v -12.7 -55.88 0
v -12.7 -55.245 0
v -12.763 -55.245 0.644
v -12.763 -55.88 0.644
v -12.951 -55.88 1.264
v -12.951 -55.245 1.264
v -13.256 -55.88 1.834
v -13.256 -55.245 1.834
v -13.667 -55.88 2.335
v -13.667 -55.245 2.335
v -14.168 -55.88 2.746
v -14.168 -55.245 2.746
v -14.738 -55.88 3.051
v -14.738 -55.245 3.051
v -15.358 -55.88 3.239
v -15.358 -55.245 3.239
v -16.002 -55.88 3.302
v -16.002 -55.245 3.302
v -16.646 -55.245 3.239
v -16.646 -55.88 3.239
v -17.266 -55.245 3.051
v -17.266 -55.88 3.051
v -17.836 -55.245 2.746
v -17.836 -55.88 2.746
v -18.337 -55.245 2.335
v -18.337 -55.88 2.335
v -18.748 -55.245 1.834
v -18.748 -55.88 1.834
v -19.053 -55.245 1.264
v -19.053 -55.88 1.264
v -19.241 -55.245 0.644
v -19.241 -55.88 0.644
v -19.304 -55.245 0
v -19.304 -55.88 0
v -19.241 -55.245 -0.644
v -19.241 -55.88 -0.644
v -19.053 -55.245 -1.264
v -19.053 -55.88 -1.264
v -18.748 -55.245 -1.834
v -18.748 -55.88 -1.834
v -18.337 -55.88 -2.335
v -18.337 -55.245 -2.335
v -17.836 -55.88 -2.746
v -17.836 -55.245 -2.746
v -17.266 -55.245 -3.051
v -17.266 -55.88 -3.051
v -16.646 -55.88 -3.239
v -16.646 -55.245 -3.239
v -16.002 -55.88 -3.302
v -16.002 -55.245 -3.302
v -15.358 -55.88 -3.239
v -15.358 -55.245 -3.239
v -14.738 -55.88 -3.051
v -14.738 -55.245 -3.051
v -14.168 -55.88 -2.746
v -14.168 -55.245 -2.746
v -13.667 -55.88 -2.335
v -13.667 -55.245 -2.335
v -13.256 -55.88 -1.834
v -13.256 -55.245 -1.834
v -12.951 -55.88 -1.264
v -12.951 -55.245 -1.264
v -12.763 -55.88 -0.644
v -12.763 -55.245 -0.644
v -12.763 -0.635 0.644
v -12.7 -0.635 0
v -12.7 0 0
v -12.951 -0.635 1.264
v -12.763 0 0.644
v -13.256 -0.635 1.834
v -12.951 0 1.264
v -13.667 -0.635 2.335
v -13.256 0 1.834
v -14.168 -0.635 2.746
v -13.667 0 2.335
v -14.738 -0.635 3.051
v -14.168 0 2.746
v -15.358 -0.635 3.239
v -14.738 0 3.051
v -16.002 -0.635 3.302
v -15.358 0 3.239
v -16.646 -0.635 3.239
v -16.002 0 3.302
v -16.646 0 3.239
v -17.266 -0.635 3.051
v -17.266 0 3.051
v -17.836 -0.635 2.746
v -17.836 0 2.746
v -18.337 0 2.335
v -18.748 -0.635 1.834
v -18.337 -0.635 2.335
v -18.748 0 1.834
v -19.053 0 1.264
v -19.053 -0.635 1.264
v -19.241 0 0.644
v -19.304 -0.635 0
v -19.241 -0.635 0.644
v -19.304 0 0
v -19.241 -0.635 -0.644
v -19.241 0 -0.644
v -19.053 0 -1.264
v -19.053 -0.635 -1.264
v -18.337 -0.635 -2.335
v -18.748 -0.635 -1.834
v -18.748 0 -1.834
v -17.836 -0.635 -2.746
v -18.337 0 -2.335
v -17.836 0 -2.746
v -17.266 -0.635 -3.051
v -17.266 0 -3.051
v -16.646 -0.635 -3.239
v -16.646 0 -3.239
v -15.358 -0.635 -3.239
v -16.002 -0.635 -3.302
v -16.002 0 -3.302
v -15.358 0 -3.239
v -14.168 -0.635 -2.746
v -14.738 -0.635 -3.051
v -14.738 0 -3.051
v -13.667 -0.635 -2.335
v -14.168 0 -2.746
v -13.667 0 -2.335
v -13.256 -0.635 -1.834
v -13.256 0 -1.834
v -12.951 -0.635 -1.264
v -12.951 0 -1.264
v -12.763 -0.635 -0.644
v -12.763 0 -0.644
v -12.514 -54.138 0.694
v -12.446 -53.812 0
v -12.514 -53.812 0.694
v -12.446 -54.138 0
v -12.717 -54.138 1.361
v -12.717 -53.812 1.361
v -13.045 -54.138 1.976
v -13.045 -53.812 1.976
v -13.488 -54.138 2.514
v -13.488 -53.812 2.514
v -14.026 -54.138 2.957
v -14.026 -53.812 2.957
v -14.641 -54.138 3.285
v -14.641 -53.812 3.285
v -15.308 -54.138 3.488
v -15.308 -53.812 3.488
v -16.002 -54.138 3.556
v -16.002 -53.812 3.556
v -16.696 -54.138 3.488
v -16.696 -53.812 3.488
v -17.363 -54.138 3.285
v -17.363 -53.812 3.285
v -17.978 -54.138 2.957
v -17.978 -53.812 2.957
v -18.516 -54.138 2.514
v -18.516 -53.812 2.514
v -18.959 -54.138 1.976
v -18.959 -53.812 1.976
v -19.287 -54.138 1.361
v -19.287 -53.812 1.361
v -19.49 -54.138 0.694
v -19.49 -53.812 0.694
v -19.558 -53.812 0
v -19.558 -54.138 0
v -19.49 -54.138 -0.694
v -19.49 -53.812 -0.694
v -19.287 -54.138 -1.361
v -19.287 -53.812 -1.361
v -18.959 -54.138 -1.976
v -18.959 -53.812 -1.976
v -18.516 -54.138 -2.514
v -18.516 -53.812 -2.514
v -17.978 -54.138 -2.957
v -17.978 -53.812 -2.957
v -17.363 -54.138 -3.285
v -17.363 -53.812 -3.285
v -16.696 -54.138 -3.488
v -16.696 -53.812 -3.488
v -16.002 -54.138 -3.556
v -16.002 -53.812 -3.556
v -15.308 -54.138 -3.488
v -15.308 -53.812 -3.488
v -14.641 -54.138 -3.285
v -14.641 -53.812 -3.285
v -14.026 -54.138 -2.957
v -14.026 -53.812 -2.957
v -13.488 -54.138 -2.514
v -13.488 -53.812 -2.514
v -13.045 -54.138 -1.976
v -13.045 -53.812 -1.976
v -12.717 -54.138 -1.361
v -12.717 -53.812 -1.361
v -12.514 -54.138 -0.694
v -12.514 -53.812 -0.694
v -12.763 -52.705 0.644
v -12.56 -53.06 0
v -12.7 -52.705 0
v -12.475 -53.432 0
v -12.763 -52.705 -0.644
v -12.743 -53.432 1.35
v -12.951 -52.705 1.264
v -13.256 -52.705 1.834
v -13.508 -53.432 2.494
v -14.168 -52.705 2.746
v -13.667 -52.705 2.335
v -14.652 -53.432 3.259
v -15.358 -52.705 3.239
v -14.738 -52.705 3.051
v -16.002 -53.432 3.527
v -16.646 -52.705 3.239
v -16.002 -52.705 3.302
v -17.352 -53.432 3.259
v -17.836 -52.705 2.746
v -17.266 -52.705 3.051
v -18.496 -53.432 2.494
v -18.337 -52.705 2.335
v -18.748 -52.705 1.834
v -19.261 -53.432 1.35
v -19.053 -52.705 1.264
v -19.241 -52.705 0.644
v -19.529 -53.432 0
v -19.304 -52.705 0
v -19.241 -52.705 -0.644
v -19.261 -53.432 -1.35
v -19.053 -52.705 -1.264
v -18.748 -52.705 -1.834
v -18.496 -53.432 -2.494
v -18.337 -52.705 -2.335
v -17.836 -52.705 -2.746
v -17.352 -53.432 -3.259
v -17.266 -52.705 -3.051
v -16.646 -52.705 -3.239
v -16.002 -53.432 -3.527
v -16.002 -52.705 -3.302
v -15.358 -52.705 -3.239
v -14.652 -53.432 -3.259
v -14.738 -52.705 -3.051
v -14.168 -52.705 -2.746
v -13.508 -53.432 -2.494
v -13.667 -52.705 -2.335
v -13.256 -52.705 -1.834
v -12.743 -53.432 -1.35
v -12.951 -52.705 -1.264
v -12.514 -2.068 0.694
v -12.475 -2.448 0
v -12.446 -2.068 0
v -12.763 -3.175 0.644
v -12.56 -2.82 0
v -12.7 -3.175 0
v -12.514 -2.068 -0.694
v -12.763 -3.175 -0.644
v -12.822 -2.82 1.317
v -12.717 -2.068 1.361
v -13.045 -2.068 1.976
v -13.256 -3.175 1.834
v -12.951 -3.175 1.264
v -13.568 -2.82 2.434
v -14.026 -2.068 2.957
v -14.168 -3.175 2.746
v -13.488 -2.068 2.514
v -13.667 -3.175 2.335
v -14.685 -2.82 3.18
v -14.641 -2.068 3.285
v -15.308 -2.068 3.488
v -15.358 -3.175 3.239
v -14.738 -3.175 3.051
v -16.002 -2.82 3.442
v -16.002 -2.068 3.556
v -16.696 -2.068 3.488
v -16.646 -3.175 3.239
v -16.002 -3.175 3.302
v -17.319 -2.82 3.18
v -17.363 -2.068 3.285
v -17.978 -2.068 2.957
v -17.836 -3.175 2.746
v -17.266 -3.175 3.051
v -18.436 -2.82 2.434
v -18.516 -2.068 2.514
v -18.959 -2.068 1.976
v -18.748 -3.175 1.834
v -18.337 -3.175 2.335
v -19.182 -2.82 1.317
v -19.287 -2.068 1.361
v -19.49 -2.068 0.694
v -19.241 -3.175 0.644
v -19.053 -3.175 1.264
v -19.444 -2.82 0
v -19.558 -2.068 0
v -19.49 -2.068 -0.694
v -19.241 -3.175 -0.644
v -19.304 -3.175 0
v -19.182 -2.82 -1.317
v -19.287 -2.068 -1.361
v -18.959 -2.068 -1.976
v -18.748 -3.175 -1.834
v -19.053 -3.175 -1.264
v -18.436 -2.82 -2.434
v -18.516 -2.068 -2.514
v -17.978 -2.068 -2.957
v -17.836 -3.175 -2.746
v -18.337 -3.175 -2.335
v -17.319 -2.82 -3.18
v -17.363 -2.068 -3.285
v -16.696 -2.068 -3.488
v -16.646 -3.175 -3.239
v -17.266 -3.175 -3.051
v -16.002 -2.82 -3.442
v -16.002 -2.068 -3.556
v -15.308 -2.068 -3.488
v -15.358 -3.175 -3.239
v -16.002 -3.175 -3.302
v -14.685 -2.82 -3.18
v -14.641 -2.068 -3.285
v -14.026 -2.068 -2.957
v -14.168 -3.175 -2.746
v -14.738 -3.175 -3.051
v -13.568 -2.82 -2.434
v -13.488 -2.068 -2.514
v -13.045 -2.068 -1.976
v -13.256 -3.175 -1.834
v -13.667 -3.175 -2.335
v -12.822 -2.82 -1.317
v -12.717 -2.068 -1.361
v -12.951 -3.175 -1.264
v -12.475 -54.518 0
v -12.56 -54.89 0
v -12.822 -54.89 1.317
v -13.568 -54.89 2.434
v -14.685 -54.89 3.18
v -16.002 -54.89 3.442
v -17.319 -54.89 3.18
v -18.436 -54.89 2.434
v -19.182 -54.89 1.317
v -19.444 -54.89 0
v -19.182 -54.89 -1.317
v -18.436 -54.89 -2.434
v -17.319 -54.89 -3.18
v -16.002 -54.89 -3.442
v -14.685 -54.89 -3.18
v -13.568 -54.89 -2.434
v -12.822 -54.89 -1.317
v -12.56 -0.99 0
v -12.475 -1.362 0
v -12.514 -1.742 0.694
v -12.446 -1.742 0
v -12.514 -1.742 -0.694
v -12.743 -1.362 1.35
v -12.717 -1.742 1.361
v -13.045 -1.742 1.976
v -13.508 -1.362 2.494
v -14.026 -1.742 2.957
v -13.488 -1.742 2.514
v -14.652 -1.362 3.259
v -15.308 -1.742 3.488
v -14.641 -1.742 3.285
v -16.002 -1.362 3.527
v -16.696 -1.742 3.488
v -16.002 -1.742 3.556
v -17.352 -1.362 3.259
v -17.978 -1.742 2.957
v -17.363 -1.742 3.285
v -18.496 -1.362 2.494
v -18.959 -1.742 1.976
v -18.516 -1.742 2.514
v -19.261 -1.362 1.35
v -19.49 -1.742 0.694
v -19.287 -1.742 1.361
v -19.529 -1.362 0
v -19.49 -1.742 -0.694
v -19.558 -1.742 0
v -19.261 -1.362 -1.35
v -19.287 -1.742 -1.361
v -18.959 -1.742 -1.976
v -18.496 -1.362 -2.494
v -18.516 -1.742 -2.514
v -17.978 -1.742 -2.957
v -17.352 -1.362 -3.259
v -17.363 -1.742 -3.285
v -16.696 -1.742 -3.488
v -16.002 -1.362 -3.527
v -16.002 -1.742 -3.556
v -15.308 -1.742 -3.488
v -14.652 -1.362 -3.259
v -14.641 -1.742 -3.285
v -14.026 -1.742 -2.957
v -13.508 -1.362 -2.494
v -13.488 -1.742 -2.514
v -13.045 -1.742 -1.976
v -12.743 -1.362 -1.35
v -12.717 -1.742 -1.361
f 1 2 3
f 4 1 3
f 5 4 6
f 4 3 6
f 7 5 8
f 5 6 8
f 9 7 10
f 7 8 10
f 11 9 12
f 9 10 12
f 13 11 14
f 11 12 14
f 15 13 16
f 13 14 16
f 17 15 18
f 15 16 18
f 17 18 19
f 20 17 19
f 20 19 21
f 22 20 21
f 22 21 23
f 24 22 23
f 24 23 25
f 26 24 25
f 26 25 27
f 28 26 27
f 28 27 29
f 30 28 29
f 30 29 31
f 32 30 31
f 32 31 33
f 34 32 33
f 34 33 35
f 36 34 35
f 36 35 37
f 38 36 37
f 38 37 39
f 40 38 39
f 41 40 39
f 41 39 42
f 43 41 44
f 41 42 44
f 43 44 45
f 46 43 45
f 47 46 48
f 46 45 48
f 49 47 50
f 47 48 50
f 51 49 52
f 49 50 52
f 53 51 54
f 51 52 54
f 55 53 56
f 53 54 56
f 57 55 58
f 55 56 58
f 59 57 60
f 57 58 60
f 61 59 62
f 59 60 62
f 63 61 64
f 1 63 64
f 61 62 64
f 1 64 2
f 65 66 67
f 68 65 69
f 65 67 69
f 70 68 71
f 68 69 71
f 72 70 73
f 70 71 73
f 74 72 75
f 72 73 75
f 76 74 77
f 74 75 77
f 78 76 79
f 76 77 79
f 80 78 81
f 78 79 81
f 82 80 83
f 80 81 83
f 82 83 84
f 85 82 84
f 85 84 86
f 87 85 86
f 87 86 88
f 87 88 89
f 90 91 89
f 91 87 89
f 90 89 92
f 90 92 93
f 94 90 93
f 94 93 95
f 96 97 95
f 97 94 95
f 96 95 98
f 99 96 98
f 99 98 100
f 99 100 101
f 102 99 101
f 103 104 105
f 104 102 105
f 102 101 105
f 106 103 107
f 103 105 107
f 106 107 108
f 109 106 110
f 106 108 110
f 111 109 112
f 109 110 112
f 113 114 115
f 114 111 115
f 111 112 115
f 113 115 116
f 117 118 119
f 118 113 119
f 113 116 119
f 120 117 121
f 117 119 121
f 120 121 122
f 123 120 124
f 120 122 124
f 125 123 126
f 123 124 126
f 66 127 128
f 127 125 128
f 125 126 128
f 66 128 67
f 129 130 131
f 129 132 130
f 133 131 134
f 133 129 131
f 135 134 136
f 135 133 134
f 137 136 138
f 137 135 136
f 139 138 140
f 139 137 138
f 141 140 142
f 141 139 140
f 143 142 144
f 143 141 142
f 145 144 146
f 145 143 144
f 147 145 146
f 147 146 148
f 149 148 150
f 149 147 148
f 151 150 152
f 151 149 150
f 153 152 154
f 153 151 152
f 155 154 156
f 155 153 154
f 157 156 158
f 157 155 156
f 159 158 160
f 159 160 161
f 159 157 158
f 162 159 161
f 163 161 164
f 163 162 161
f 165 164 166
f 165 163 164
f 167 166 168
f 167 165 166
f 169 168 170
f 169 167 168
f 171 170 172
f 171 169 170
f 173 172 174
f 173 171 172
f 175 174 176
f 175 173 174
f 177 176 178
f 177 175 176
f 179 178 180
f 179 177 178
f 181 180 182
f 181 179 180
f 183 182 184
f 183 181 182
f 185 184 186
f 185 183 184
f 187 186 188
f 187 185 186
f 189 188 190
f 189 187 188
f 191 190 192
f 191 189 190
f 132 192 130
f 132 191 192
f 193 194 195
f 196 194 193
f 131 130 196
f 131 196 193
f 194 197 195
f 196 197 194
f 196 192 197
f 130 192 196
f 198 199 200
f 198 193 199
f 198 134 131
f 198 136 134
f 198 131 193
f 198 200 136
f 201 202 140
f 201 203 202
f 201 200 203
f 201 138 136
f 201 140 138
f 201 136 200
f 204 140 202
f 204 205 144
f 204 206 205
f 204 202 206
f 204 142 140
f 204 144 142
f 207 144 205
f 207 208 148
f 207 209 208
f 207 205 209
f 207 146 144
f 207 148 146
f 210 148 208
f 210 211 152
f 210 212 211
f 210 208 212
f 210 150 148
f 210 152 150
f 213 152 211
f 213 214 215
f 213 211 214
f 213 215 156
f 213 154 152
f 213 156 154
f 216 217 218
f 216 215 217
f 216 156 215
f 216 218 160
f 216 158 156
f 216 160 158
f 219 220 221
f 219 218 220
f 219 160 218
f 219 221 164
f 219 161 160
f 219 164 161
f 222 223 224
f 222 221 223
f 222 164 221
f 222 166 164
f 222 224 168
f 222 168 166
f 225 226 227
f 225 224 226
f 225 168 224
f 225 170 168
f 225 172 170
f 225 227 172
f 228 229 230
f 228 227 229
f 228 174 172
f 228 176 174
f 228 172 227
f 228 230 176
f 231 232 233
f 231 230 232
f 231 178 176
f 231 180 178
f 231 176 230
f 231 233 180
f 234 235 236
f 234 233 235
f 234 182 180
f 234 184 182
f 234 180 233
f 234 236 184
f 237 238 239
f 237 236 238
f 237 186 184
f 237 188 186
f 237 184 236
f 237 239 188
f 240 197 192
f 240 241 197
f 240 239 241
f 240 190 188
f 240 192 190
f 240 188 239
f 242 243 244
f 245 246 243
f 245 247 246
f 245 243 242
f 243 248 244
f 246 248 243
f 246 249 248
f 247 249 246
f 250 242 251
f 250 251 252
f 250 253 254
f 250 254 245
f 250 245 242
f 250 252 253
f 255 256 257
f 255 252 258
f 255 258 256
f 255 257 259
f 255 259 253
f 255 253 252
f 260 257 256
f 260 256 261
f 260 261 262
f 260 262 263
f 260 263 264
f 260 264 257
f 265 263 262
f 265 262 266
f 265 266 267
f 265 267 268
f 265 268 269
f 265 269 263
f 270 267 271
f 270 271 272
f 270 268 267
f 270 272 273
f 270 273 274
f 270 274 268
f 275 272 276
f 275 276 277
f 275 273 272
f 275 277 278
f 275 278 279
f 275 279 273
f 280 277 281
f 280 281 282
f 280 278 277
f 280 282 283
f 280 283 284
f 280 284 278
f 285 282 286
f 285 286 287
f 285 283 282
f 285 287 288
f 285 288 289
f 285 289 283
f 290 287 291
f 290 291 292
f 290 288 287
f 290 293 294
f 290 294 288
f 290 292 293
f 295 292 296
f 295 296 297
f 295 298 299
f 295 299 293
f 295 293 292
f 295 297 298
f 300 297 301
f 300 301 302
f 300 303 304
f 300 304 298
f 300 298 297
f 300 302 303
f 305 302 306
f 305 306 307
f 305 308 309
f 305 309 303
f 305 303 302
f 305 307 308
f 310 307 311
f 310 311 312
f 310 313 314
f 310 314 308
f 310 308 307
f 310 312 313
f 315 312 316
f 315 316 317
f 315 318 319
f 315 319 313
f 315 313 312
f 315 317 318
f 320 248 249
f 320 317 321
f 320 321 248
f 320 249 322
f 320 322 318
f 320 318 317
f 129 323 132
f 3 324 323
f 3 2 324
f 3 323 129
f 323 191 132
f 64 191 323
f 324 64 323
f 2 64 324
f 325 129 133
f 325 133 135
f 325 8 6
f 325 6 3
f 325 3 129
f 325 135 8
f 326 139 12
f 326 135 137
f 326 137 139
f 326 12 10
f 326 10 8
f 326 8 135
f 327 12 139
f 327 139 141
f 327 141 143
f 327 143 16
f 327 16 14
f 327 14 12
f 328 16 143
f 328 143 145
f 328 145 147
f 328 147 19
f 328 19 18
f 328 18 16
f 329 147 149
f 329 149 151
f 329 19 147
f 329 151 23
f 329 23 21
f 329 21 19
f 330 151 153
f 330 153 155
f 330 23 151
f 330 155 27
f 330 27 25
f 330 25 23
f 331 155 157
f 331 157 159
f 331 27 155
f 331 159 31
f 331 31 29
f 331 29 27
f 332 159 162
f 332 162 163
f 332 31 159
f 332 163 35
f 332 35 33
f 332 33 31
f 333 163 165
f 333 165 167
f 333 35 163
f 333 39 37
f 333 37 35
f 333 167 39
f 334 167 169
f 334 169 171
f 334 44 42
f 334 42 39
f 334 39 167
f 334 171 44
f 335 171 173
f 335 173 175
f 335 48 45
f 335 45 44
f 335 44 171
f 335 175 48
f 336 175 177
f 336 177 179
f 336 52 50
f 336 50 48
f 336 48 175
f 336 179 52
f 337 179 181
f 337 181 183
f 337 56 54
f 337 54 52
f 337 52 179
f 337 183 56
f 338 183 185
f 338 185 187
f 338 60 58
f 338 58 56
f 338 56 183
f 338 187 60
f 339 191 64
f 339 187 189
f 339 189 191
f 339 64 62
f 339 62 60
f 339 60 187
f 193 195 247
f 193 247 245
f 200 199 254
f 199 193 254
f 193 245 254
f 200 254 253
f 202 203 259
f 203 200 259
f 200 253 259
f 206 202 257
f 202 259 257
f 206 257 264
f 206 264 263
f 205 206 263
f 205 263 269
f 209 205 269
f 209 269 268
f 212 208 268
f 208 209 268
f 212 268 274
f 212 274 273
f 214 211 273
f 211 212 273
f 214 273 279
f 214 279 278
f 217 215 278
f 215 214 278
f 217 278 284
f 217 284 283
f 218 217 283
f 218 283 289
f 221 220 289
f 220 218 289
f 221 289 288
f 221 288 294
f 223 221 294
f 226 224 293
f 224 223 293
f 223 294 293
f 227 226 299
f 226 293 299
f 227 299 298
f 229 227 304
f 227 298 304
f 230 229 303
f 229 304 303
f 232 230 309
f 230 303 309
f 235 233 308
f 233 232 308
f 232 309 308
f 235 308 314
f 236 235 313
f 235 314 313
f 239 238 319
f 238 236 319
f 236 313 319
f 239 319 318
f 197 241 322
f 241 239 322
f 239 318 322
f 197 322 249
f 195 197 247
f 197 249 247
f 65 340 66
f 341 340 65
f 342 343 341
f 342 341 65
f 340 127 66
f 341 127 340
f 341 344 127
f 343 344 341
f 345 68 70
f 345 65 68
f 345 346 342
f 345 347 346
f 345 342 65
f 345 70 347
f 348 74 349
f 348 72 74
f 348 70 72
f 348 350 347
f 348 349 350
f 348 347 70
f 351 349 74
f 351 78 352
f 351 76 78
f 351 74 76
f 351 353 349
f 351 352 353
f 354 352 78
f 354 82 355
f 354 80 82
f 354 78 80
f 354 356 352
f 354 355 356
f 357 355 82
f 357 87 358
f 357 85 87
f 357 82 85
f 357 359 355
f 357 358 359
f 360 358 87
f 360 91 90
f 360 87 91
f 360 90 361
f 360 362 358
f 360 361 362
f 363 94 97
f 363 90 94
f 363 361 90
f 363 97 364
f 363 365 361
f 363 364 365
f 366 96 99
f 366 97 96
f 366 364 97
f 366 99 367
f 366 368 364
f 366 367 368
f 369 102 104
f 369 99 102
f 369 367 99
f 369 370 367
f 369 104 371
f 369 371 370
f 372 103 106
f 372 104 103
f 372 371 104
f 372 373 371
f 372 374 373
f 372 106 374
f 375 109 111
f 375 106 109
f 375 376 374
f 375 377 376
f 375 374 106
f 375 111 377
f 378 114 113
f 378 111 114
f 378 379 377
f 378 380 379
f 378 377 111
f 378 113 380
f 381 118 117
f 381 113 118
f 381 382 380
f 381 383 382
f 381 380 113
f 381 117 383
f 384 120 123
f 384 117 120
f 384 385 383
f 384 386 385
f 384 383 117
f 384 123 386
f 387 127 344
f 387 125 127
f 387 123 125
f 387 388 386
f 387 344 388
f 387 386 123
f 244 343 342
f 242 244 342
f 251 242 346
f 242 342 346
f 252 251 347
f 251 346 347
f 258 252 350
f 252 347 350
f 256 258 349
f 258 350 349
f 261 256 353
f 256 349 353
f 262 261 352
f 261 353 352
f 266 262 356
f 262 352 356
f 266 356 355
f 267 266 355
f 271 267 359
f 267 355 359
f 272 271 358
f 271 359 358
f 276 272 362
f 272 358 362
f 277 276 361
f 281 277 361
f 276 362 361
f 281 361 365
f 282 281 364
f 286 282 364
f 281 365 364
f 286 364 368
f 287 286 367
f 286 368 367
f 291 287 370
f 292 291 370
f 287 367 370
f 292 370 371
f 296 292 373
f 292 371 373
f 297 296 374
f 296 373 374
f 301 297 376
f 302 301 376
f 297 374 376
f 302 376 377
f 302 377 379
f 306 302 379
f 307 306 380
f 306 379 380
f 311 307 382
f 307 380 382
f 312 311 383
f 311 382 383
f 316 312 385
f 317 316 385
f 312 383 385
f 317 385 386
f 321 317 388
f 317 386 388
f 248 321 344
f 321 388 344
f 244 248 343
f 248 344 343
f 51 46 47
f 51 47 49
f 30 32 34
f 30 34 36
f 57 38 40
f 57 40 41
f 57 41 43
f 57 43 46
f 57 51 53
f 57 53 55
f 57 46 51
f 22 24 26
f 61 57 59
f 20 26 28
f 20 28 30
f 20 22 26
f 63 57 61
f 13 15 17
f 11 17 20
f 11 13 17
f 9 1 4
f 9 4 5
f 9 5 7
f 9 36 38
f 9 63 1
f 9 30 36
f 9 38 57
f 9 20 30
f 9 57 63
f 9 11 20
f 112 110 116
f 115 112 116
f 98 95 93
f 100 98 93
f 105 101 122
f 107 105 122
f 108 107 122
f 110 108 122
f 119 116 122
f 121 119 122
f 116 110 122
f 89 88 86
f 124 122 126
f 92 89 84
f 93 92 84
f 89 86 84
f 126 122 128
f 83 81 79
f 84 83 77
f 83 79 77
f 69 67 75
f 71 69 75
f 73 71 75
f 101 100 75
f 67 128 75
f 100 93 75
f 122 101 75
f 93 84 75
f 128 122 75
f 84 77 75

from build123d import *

# Parameters (mm, degrees)
F0_R     = 3.302
F1_DEPTH = 55.88
F3_R     = 3.556
F4_DEPTH = 1.27


# Not quite as in the source:
# - a fillet or chamfer that OpenCascade refuses, or shapes differently, is made with other operations: its cross-section is extruded or revolved along the edge and cut away or added
# - a feature names something its author has since deleted; it is built from what else it names


with BuildPart() as f1:
    # F0 (on Front) → F1 (new body)
    with BuildSketch(Plane.XZ):
        with Locations((-16.002, 0)):
            Circle(F0_R)
    extrude(amount=F1_DEPTH)

    # F3 (on offset) → F4 (join, symmetric)
    with BuildSketch(Plane.XZ.offset(53.975)):
        with Locations((-16.002, 0)):
            Circle(F3_R)
    extrude(amount=F4_DEPTH, both=True)

    # F6: F1 across plane


with BuildPart() as f1_1:
    add(f1.part)
    add(f1.part.mirror(Plane(origin=(-16.002, -27.94, 0), x_dir=(1, 0, 0), z_dir=(0, -1, 0))))

    # F7: fillet of radius 2.54 on 4 edges, made by hand

    # F7_s1 → F7_t2 (revolve, cut)
    with BuildSketch(Plane.XY):
        with BuildLine():
            ThreePointArc((-12.446, -54.1378396683), (-12.5103142364, -54.7058009346), (-12.7, -55.245))
            Line((-12.7, -55.245), (-12.446, -55.245))
            Line((-12.446, -55.245), (-12.446, -54.1378396683))
        make_face()
    revolve(axis=Axis((-16.002, -55.245, 0), (0, -1, 0)), mode=Mode.SUBTRACT)

    # F7_s3 → F7_t4 (revolve, cut)
    with BuildSketch(Plane.XY):
        with BuildLine():
            ThreePointArc((-12.7, -52.705), (-12.5103142364, -53.2441990654), (-12.446, -53.8121603317))
            Line((-12.446, -53.8121603317), (-12.446, -52.705))
            Line((-12.446, -52.705), (-12.7, -52.705))
        make_face()
    revolve(axis=Axis((-16.002, -52.705, 0), (0, -1, 0)), mode=Mode.SUBTRACT)

    # F7_s5 → F7_t6 (revolve, cut)
    with BuildSketch(Plane.XY):
        with BuildLine():
            ThreePointArc((-12.446, -2.0678396683), (-12.5103142364, -2.6358009346), (-12.7, -3.175))
            Line((-12.7, -3.175), (-12.446, -3.175))
            Line((-12.446, -3.175), (-12.446, -2.0678396683))
        make_face()
    revolve(axis=Axis((-16.002, -3.175, 0), (0, -1, 0)), mode=Mode.SUBTRACT)

    # F7_s7 → F7_t8 (revolve, cut)
    with BuildSketch(Plane.XY):
        with BuildLine():
            ThreePointArc((-12.7, -0.635), (-12.5103142364, -1.1741990654), (-12.446, -1.7421603317))
            Line((-12.446, -1.7421603317), (-12.446, -0.635))
            Line((-12.446, -0.635), (-12.7, -0.635))
        make_face()
    revolve(axis=Axis((-16.002, -0.635, 0), (0, -1, 0)), mode=Mode.SUBTRACT)


solid = f1_1.part
